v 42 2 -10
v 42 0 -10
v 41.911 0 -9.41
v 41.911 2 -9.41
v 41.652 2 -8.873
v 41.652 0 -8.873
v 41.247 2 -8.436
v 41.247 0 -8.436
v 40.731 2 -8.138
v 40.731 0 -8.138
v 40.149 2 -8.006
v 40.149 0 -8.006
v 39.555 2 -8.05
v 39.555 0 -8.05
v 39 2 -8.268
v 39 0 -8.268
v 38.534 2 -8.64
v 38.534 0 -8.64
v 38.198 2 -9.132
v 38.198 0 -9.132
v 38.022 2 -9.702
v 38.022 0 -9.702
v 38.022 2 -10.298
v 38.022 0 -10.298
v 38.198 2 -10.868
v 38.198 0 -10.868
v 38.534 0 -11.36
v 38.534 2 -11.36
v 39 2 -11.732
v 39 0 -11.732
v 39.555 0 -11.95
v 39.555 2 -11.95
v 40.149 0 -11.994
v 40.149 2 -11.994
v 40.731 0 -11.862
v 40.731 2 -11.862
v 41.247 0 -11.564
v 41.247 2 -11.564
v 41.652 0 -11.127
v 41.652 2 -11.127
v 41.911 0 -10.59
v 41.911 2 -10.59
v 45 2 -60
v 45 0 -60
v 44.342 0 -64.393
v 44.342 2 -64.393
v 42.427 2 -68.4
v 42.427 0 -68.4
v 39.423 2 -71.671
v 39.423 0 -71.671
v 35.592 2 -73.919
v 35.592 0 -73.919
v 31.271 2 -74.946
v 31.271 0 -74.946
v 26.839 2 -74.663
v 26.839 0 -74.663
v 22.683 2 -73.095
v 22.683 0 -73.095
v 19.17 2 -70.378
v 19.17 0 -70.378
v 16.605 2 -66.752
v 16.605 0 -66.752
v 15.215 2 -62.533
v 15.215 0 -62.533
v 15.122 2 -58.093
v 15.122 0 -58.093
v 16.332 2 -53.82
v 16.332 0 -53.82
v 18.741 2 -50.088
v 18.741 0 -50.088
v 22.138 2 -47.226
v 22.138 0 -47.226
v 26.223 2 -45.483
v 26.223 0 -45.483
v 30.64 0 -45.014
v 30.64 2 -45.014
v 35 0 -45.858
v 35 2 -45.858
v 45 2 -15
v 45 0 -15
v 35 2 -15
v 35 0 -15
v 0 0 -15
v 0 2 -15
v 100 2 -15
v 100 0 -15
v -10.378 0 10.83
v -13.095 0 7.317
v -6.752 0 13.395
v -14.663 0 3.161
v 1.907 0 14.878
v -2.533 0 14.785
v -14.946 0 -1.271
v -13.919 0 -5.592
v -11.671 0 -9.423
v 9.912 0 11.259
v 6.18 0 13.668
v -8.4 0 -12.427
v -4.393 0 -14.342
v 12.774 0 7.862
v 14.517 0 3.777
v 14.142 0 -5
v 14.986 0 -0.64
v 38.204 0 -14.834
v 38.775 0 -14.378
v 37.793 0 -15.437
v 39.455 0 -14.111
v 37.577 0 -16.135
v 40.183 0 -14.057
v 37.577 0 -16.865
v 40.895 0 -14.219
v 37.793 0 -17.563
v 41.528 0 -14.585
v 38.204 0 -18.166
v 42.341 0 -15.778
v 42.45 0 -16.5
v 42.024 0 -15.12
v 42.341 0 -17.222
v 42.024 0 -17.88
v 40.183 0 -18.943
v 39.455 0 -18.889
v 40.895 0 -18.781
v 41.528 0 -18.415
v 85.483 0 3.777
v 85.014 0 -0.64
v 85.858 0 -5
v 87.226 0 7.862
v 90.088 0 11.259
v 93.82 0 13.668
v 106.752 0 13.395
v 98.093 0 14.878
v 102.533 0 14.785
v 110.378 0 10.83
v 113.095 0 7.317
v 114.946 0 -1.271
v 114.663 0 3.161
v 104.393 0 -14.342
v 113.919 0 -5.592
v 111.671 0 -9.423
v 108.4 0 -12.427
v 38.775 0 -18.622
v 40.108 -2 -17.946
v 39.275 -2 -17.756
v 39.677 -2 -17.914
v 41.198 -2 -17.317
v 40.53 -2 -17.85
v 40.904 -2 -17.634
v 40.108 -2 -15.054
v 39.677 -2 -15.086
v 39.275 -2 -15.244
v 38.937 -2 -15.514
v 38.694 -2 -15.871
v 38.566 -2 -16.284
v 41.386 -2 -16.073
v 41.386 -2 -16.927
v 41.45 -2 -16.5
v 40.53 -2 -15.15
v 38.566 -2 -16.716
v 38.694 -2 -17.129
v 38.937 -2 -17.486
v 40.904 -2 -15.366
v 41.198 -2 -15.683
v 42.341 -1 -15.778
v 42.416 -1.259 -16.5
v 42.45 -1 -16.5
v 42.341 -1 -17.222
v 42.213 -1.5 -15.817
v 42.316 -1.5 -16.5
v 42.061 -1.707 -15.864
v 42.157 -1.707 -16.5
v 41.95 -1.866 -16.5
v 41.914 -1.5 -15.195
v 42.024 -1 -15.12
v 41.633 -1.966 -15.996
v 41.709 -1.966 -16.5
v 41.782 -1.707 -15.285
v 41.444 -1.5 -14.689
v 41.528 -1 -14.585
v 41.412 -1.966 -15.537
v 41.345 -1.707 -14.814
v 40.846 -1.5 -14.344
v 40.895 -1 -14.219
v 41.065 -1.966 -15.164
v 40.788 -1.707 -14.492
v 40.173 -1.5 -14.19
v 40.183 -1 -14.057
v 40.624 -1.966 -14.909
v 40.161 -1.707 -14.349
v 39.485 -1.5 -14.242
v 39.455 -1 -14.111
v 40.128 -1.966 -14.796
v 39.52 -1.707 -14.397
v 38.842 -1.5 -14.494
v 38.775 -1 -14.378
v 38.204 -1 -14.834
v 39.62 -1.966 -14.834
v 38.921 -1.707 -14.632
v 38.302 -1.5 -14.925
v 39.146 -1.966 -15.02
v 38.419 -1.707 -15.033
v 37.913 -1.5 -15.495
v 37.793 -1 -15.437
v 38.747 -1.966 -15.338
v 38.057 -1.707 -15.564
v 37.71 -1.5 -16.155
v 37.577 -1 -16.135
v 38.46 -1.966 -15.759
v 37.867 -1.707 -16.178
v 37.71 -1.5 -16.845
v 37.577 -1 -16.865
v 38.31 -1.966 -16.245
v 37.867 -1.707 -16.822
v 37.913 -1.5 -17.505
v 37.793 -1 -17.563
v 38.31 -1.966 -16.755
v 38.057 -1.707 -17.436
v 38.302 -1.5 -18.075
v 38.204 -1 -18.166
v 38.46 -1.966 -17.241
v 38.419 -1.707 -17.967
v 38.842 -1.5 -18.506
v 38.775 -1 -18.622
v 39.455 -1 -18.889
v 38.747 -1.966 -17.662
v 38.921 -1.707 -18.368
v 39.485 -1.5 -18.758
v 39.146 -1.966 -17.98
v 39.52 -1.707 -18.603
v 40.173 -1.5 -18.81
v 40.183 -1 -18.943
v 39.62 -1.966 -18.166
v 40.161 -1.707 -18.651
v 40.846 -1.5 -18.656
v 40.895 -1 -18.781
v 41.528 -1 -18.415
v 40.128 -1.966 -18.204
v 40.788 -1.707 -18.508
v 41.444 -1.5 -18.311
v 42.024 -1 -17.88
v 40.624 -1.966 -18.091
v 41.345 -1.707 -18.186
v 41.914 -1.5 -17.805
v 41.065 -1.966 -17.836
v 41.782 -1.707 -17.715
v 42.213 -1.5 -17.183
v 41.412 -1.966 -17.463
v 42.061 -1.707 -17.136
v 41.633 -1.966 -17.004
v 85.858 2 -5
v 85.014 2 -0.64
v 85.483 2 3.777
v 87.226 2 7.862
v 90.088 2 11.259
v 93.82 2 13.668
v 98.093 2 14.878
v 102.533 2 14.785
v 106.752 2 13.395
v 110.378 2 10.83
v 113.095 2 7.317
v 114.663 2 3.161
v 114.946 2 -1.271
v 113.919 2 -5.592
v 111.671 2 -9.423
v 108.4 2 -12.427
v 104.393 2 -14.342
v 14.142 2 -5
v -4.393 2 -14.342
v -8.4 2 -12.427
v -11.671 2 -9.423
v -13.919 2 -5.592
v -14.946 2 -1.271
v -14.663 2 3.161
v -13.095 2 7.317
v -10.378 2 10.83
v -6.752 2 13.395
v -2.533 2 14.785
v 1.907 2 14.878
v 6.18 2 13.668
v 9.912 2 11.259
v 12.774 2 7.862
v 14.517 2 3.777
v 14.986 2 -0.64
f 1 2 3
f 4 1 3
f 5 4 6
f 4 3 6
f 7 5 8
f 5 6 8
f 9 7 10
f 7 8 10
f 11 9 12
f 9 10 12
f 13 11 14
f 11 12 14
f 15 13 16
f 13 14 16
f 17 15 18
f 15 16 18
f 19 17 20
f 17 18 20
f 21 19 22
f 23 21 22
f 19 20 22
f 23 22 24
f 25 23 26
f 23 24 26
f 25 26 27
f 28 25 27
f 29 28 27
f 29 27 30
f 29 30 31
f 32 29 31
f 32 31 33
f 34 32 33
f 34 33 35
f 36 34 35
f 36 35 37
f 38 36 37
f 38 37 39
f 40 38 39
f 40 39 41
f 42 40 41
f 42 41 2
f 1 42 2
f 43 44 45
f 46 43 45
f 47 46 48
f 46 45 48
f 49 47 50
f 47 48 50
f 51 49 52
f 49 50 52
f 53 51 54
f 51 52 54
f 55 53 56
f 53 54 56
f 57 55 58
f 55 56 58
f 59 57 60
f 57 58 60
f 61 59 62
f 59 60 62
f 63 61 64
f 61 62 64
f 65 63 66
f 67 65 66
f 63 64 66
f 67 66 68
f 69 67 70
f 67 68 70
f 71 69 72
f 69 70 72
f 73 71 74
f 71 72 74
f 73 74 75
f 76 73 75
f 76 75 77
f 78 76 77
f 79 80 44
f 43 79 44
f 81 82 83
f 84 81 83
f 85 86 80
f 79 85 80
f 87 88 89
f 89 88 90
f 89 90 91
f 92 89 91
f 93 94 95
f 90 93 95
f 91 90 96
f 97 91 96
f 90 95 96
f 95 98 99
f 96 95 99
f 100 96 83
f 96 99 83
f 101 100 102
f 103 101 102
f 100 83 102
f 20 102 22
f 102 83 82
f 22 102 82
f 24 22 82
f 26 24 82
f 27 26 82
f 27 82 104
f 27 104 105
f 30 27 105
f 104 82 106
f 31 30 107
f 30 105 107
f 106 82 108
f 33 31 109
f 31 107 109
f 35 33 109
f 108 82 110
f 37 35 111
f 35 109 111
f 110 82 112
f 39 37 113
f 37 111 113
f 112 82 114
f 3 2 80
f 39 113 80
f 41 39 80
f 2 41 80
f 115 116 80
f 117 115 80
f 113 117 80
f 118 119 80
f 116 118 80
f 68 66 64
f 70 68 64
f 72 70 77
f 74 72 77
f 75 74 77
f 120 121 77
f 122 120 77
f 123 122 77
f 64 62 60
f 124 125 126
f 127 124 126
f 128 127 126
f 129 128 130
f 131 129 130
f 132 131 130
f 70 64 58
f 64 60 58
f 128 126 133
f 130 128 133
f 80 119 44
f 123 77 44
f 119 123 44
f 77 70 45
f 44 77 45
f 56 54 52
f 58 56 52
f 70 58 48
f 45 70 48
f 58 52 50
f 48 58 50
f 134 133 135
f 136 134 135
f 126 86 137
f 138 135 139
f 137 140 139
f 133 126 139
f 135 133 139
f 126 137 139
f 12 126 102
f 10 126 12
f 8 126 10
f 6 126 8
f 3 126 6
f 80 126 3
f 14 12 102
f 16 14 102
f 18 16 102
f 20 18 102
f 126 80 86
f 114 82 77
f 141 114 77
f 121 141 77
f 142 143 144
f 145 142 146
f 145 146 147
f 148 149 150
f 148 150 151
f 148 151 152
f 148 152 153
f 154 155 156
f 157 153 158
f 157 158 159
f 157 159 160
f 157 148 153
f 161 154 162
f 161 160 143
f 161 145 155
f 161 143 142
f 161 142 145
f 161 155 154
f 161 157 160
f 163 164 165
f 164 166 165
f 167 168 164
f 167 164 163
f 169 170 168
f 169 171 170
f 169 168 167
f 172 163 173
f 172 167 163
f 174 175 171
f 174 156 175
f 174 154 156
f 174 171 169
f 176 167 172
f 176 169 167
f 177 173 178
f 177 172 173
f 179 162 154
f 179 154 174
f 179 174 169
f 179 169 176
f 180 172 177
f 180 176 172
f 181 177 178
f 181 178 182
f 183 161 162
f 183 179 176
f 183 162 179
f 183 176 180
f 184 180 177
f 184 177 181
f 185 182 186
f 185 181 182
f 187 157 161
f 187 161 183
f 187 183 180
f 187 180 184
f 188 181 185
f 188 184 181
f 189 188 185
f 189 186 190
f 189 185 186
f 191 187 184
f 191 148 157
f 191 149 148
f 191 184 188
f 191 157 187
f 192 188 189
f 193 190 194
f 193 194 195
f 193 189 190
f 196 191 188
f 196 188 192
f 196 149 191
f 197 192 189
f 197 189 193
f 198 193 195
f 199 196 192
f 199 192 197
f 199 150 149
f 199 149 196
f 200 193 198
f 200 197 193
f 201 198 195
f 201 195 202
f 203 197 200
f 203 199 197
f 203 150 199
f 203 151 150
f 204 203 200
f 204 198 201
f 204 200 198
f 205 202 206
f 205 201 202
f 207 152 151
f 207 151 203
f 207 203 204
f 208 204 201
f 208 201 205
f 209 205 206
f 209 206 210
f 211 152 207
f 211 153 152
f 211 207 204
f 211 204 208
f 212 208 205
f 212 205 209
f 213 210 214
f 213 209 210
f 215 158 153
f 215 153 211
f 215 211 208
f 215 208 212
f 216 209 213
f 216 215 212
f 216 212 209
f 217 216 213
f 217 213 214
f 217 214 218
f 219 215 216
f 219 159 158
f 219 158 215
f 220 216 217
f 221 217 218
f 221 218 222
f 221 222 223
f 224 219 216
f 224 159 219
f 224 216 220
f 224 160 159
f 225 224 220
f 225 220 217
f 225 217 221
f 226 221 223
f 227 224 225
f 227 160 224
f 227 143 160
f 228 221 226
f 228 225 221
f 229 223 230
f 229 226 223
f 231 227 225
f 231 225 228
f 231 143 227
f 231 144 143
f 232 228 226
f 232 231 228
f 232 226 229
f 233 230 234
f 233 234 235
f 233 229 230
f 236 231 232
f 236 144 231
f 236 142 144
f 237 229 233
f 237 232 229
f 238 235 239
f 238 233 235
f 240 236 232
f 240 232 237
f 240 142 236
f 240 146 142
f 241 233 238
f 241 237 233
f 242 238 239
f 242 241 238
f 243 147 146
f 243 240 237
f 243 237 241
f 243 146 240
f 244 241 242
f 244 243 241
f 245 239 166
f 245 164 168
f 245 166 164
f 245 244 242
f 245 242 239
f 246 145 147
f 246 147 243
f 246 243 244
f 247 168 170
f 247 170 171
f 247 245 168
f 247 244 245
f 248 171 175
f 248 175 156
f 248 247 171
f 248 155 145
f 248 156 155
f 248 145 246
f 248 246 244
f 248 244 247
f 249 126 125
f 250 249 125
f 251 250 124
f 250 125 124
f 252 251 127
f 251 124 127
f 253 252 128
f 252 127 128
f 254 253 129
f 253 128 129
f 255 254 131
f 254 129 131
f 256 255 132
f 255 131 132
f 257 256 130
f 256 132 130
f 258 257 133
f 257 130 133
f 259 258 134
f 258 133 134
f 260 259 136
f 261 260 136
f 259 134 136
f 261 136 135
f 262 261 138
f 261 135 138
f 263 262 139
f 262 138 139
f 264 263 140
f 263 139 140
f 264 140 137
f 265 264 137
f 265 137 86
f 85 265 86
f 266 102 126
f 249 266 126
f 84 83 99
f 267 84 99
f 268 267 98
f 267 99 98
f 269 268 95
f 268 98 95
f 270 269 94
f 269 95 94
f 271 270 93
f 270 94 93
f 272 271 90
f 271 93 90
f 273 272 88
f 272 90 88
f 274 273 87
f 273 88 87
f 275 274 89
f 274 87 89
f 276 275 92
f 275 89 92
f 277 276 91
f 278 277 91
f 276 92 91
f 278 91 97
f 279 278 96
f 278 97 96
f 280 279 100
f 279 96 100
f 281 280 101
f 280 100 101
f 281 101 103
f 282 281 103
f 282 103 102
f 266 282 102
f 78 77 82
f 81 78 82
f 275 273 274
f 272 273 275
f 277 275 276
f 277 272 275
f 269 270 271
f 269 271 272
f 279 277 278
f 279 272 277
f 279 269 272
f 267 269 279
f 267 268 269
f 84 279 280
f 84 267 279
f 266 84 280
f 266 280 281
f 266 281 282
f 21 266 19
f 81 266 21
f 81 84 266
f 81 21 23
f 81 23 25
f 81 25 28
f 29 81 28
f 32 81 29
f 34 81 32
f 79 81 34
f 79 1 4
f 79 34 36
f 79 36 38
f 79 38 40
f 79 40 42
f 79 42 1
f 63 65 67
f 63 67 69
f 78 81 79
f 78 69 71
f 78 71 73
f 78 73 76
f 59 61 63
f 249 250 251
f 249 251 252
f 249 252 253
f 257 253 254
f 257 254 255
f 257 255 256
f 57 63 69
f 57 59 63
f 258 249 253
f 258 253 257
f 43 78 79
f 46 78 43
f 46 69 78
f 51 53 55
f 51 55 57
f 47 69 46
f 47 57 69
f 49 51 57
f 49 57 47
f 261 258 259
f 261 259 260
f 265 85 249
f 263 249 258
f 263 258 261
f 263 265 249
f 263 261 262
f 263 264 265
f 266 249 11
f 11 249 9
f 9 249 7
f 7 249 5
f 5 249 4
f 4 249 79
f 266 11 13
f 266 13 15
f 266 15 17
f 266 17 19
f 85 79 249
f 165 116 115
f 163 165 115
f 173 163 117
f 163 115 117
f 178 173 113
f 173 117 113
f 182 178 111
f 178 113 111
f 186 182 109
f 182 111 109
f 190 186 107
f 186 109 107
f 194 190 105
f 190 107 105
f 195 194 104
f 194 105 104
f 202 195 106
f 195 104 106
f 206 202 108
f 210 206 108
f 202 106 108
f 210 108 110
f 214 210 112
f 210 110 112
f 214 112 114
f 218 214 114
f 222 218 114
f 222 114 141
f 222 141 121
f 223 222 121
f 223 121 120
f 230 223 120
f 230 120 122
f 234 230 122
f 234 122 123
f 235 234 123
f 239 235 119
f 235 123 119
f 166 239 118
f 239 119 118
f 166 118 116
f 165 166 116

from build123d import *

# Parameters (mm, degrees)
BASEEXTRUDE_DEPTH   = 2
SKETCH1_R           = 2
CUT_EXTRUDE1_DEPTH  = 3
SKETCH2_R           = 2.45
BOSS_EXTRUDE1_DEPTH = 2
FILLET1_R           = 1


with BuildPart() as part:
    # BaseSketch → BaseExtrude (new body)
    with BuildSketch(Plane(origin=(0, 0, 0), x_dir=(1, 0, 0), z_dir=(0, 1, 0))):
        with BuildLine():
            Line((35, 15), (0, 15))
            ThreePointArc((0, 15), (-8.660254038, -12.247448714), (14.142135624, 5))
            Line((14.142135624, 5), (45, 5))
            Line((45, 5), (85.857864376, 5))
            ThreePointArc((85.857864376, 5), (108.660254038, -12.247448714), (100, 15))
            Line((100, 15), (45, 15))
            Line((45, 15), (45, 60))
            ThreePointArc((45, 60), (17.752551286, 68.660254038), (35, 45.857864376))
            Line((35, 45.857864376), (35, 15))
        make_face()
    extrude(amount=BASEEXTRUDE_DEPTH)

    # Sketch1 → Cut-Extrude1 (cut, through all)
    with BuildSketch(Plane.XZ):
        with Locations((40, -10)):
            Circle(SKETCH1_R)
    extrude(amount=-CUT_EXTRUDE1_DEPTH, mode=Mode.SUBTRACT)

    # Sketch2 → Boss-Extrude1 (add)
    with BuildSketch(Plane.XZ):
        with Locations((40, -16.5)):
            Circle(SKETCH2_R)
    extrude(amount=BOSS_EXTRUDE1_DEPTH)

    # Fillet1
    fillet1_edges = [part.edges().sort_by_distance(p)[0] for p in [
        (37.55, -2, -16.5),
    ]]
    fillet(fillet1_edges, radius=FILLET1_R)


solid = part.part
